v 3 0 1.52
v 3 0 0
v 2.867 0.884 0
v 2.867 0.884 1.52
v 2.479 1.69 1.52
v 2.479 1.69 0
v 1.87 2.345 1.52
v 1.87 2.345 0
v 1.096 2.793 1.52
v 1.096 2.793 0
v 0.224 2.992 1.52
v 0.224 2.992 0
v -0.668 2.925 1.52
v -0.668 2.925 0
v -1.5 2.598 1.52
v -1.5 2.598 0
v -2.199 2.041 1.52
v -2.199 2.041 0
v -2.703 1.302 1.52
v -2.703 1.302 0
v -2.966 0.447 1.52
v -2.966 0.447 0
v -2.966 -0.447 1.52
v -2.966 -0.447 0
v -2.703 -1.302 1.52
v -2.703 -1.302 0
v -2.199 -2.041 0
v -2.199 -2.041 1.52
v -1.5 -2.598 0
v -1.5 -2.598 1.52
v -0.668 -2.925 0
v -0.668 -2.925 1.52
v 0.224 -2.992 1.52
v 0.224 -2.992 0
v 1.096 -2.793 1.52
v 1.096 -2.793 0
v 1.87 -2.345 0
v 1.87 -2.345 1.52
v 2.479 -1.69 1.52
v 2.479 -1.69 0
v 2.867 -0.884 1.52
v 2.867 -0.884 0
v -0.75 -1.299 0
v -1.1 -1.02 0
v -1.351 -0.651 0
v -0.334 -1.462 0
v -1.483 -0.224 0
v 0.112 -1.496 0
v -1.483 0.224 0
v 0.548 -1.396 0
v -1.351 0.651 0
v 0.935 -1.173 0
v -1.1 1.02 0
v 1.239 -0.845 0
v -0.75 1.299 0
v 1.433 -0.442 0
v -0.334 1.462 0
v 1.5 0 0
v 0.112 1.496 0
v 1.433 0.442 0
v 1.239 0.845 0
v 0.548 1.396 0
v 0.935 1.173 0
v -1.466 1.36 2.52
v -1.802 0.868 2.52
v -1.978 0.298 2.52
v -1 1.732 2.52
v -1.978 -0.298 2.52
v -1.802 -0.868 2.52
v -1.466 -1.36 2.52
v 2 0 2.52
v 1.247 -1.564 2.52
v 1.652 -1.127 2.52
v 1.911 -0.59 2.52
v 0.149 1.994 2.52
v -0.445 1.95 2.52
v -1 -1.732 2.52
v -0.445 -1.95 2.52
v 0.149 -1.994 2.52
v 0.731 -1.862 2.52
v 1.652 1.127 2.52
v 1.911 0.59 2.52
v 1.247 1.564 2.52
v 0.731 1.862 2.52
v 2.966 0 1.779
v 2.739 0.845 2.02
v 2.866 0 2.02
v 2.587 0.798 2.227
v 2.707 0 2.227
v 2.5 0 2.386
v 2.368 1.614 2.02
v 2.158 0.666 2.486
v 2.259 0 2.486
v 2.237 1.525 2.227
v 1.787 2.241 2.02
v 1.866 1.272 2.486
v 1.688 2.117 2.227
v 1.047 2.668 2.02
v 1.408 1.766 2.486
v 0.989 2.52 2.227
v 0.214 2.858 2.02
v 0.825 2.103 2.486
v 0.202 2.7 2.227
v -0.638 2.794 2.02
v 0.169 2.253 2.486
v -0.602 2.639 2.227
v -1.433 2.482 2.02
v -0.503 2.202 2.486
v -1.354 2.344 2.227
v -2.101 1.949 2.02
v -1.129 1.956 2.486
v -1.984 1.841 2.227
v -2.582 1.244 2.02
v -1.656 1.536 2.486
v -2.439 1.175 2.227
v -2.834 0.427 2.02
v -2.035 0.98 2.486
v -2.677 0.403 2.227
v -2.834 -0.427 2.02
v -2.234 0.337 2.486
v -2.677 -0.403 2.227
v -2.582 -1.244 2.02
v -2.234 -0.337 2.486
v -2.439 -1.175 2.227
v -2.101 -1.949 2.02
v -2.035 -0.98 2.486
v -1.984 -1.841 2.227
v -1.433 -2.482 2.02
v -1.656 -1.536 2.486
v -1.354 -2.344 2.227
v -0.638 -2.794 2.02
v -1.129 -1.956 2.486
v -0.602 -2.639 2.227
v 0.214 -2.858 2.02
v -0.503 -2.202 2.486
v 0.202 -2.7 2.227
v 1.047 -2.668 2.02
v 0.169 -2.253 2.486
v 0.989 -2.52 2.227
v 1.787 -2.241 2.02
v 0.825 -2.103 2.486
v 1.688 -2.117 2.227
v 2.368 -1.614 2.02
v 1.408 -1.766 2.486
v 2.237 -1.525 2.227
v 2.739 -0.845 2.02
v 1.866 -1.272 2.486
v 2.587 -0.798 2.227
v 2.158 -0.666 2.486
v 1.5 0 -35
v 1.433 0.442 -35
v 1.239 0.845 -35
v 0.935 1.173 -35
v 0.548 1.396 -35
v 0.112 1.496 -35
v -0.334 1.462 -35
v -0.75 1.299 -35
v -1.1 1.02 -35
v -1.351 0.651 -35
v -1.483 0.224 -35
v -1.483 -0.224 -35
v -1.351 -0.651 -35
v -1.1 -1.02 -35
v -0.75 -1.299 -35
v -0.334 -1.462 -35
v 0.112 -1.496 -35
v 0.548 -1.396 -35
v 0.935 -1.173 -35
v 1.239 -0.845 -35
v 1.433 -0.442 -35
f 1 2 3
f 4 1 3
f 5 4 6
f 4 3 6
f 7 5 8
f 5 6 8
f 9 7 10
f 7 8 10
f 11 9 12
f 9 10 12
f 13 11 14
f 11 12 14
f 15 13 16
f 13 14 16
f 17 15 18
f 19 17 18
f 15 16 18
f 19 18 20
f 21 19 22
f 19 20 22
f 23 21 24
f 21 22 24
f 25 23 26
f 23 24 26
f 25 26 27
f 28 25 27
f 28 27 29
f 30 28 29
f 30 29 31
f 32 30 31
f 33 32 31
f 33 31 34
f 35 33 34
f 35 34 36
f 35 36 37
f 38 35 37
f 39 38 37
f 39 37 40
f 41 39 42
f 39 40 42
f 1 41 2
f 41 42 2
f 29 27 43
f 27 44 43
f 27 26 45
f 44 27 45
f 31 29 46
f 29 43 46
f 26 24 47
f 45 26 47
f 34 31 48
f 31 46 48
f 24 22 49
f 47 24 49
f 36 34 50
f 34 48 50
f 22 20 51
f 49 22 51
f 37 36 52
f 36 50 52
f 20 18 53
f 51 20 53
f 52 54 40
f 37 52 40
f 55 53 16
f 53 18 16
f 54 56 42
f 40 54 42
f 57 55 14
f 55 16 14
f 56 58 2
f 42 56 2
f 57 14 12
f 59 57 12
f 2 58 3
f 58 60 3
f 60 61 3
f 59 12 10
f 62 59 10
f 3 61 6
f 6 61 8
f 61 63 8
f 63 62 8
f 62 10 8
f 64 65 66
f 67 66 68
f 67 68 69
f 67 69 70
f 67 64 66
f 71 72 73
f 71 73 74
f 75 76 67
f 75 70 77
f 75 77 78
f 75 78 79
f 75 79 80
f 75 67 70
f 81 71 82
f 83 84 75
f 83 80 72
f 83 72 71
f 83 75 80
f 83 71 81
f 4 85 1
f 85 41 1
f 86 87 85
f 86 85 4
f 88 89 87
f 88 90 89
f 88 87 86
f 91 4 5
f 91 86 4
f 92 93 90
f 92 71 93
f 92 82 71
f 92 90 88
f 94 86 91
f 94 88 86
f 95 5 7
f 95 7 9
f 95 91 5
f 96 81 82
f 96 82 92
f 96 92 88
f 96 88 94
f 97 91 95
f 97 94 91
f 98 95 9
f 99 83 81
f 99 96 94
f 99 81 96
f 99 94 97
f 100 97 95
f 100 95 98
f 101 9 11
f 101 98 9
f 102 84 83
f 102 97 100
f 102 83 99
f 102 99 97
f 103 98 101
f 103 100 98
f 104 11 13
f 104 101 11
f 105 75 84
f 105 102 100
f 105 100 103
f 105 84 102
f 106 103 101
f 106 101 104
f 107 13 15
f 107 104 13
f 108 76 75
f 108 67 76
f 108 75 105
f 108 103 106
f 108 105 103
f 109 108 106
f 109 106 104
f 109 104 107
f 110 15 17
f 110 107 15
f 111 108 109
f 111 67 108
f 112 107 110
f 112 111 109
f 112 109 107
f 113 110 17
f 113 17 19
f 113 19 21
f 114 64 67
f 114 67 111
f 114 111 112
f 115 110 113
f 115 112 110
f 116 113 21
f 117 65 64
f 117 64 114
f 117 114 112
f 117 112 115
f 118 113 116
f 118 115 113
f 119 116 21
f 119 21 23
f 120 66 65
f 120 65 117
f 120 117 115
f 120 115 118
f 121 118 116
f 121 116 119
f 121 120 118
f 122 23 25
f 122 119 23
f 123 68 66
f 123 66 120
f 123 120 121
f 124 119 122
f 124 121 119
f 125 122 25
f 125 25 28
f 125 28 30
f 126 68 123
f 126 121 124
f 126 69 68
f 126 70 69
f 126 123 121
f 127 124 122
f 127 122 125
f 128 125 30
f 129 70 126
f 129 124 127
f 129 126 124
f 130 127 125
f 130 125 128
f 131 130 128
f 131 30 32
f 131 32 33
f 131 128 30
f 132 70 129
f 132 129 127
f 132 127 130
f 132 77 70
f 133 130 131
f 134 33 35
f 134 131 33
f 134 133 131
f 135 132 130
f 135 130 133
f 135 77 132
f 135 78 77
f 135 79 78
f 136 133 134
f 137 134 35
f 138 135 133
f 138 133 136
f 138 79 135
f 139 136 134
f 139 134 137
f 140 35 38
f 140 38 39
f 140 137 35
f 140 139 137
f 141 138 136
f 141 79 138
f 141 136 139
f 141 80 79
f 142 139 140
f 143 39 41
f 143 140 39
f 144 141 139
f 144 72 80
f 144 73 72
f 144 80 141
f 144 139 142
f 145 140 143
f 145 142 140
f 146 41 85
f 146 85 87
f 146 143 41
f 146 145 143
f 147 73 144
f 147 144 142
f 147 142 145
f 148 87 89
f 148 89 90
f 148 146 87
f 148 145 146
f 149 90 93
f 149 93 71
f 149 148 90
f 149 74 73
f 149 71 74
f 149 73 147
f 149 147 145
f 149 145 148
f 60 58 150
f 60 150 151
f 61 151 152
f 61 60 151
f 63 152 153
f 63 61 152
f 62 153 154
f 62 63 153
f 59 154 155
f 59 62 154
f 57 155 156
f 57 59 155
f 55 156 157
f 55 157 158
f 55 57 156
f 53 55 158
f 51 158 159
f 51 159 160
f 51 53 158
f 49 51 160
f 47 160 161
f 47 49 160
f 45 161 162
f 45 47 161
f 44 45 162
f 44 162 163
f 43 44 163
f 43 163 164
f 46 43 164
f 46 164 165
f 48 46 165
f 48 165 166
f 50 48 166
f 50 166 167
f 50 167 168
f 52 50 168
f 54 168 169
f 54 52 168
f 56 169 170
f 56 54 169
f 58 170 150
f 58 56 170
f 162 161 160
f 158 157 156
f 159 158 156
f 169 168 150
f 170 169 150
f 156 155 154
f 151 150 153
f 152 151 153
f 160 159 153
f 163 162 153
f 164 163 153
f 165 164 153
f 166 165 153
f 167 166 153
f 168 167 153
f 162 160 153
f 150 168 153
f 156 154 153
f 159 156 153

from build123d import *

# Parameters (mm, degrees)
F0_R     = 1.5
F2_DEPTH = 35
F1_R     = 3
F3_DEPTH = 2.52
F4_R     = 1


with BuildPart() as f2:
    # F0 (on Top) → F2 (new body)
    with BuildSketch(Plane.XY):
        Circle(F0_R)
    extrude(amount=-F2_DEPTH)

    # F1 (on Top) → F3 (join)
    with BuildSketch(Plane.XY):
        Circle(F1_R)
    extrude(amount=F3_DEPTH)

    # F4
    f4_edges = [f2.edges().sort_by_distance(p)[0] for p in [
        (-3, 0, 2.52),
    ]]
    fillet(f4_edges, radius=F4_R)


solid = f2.part
